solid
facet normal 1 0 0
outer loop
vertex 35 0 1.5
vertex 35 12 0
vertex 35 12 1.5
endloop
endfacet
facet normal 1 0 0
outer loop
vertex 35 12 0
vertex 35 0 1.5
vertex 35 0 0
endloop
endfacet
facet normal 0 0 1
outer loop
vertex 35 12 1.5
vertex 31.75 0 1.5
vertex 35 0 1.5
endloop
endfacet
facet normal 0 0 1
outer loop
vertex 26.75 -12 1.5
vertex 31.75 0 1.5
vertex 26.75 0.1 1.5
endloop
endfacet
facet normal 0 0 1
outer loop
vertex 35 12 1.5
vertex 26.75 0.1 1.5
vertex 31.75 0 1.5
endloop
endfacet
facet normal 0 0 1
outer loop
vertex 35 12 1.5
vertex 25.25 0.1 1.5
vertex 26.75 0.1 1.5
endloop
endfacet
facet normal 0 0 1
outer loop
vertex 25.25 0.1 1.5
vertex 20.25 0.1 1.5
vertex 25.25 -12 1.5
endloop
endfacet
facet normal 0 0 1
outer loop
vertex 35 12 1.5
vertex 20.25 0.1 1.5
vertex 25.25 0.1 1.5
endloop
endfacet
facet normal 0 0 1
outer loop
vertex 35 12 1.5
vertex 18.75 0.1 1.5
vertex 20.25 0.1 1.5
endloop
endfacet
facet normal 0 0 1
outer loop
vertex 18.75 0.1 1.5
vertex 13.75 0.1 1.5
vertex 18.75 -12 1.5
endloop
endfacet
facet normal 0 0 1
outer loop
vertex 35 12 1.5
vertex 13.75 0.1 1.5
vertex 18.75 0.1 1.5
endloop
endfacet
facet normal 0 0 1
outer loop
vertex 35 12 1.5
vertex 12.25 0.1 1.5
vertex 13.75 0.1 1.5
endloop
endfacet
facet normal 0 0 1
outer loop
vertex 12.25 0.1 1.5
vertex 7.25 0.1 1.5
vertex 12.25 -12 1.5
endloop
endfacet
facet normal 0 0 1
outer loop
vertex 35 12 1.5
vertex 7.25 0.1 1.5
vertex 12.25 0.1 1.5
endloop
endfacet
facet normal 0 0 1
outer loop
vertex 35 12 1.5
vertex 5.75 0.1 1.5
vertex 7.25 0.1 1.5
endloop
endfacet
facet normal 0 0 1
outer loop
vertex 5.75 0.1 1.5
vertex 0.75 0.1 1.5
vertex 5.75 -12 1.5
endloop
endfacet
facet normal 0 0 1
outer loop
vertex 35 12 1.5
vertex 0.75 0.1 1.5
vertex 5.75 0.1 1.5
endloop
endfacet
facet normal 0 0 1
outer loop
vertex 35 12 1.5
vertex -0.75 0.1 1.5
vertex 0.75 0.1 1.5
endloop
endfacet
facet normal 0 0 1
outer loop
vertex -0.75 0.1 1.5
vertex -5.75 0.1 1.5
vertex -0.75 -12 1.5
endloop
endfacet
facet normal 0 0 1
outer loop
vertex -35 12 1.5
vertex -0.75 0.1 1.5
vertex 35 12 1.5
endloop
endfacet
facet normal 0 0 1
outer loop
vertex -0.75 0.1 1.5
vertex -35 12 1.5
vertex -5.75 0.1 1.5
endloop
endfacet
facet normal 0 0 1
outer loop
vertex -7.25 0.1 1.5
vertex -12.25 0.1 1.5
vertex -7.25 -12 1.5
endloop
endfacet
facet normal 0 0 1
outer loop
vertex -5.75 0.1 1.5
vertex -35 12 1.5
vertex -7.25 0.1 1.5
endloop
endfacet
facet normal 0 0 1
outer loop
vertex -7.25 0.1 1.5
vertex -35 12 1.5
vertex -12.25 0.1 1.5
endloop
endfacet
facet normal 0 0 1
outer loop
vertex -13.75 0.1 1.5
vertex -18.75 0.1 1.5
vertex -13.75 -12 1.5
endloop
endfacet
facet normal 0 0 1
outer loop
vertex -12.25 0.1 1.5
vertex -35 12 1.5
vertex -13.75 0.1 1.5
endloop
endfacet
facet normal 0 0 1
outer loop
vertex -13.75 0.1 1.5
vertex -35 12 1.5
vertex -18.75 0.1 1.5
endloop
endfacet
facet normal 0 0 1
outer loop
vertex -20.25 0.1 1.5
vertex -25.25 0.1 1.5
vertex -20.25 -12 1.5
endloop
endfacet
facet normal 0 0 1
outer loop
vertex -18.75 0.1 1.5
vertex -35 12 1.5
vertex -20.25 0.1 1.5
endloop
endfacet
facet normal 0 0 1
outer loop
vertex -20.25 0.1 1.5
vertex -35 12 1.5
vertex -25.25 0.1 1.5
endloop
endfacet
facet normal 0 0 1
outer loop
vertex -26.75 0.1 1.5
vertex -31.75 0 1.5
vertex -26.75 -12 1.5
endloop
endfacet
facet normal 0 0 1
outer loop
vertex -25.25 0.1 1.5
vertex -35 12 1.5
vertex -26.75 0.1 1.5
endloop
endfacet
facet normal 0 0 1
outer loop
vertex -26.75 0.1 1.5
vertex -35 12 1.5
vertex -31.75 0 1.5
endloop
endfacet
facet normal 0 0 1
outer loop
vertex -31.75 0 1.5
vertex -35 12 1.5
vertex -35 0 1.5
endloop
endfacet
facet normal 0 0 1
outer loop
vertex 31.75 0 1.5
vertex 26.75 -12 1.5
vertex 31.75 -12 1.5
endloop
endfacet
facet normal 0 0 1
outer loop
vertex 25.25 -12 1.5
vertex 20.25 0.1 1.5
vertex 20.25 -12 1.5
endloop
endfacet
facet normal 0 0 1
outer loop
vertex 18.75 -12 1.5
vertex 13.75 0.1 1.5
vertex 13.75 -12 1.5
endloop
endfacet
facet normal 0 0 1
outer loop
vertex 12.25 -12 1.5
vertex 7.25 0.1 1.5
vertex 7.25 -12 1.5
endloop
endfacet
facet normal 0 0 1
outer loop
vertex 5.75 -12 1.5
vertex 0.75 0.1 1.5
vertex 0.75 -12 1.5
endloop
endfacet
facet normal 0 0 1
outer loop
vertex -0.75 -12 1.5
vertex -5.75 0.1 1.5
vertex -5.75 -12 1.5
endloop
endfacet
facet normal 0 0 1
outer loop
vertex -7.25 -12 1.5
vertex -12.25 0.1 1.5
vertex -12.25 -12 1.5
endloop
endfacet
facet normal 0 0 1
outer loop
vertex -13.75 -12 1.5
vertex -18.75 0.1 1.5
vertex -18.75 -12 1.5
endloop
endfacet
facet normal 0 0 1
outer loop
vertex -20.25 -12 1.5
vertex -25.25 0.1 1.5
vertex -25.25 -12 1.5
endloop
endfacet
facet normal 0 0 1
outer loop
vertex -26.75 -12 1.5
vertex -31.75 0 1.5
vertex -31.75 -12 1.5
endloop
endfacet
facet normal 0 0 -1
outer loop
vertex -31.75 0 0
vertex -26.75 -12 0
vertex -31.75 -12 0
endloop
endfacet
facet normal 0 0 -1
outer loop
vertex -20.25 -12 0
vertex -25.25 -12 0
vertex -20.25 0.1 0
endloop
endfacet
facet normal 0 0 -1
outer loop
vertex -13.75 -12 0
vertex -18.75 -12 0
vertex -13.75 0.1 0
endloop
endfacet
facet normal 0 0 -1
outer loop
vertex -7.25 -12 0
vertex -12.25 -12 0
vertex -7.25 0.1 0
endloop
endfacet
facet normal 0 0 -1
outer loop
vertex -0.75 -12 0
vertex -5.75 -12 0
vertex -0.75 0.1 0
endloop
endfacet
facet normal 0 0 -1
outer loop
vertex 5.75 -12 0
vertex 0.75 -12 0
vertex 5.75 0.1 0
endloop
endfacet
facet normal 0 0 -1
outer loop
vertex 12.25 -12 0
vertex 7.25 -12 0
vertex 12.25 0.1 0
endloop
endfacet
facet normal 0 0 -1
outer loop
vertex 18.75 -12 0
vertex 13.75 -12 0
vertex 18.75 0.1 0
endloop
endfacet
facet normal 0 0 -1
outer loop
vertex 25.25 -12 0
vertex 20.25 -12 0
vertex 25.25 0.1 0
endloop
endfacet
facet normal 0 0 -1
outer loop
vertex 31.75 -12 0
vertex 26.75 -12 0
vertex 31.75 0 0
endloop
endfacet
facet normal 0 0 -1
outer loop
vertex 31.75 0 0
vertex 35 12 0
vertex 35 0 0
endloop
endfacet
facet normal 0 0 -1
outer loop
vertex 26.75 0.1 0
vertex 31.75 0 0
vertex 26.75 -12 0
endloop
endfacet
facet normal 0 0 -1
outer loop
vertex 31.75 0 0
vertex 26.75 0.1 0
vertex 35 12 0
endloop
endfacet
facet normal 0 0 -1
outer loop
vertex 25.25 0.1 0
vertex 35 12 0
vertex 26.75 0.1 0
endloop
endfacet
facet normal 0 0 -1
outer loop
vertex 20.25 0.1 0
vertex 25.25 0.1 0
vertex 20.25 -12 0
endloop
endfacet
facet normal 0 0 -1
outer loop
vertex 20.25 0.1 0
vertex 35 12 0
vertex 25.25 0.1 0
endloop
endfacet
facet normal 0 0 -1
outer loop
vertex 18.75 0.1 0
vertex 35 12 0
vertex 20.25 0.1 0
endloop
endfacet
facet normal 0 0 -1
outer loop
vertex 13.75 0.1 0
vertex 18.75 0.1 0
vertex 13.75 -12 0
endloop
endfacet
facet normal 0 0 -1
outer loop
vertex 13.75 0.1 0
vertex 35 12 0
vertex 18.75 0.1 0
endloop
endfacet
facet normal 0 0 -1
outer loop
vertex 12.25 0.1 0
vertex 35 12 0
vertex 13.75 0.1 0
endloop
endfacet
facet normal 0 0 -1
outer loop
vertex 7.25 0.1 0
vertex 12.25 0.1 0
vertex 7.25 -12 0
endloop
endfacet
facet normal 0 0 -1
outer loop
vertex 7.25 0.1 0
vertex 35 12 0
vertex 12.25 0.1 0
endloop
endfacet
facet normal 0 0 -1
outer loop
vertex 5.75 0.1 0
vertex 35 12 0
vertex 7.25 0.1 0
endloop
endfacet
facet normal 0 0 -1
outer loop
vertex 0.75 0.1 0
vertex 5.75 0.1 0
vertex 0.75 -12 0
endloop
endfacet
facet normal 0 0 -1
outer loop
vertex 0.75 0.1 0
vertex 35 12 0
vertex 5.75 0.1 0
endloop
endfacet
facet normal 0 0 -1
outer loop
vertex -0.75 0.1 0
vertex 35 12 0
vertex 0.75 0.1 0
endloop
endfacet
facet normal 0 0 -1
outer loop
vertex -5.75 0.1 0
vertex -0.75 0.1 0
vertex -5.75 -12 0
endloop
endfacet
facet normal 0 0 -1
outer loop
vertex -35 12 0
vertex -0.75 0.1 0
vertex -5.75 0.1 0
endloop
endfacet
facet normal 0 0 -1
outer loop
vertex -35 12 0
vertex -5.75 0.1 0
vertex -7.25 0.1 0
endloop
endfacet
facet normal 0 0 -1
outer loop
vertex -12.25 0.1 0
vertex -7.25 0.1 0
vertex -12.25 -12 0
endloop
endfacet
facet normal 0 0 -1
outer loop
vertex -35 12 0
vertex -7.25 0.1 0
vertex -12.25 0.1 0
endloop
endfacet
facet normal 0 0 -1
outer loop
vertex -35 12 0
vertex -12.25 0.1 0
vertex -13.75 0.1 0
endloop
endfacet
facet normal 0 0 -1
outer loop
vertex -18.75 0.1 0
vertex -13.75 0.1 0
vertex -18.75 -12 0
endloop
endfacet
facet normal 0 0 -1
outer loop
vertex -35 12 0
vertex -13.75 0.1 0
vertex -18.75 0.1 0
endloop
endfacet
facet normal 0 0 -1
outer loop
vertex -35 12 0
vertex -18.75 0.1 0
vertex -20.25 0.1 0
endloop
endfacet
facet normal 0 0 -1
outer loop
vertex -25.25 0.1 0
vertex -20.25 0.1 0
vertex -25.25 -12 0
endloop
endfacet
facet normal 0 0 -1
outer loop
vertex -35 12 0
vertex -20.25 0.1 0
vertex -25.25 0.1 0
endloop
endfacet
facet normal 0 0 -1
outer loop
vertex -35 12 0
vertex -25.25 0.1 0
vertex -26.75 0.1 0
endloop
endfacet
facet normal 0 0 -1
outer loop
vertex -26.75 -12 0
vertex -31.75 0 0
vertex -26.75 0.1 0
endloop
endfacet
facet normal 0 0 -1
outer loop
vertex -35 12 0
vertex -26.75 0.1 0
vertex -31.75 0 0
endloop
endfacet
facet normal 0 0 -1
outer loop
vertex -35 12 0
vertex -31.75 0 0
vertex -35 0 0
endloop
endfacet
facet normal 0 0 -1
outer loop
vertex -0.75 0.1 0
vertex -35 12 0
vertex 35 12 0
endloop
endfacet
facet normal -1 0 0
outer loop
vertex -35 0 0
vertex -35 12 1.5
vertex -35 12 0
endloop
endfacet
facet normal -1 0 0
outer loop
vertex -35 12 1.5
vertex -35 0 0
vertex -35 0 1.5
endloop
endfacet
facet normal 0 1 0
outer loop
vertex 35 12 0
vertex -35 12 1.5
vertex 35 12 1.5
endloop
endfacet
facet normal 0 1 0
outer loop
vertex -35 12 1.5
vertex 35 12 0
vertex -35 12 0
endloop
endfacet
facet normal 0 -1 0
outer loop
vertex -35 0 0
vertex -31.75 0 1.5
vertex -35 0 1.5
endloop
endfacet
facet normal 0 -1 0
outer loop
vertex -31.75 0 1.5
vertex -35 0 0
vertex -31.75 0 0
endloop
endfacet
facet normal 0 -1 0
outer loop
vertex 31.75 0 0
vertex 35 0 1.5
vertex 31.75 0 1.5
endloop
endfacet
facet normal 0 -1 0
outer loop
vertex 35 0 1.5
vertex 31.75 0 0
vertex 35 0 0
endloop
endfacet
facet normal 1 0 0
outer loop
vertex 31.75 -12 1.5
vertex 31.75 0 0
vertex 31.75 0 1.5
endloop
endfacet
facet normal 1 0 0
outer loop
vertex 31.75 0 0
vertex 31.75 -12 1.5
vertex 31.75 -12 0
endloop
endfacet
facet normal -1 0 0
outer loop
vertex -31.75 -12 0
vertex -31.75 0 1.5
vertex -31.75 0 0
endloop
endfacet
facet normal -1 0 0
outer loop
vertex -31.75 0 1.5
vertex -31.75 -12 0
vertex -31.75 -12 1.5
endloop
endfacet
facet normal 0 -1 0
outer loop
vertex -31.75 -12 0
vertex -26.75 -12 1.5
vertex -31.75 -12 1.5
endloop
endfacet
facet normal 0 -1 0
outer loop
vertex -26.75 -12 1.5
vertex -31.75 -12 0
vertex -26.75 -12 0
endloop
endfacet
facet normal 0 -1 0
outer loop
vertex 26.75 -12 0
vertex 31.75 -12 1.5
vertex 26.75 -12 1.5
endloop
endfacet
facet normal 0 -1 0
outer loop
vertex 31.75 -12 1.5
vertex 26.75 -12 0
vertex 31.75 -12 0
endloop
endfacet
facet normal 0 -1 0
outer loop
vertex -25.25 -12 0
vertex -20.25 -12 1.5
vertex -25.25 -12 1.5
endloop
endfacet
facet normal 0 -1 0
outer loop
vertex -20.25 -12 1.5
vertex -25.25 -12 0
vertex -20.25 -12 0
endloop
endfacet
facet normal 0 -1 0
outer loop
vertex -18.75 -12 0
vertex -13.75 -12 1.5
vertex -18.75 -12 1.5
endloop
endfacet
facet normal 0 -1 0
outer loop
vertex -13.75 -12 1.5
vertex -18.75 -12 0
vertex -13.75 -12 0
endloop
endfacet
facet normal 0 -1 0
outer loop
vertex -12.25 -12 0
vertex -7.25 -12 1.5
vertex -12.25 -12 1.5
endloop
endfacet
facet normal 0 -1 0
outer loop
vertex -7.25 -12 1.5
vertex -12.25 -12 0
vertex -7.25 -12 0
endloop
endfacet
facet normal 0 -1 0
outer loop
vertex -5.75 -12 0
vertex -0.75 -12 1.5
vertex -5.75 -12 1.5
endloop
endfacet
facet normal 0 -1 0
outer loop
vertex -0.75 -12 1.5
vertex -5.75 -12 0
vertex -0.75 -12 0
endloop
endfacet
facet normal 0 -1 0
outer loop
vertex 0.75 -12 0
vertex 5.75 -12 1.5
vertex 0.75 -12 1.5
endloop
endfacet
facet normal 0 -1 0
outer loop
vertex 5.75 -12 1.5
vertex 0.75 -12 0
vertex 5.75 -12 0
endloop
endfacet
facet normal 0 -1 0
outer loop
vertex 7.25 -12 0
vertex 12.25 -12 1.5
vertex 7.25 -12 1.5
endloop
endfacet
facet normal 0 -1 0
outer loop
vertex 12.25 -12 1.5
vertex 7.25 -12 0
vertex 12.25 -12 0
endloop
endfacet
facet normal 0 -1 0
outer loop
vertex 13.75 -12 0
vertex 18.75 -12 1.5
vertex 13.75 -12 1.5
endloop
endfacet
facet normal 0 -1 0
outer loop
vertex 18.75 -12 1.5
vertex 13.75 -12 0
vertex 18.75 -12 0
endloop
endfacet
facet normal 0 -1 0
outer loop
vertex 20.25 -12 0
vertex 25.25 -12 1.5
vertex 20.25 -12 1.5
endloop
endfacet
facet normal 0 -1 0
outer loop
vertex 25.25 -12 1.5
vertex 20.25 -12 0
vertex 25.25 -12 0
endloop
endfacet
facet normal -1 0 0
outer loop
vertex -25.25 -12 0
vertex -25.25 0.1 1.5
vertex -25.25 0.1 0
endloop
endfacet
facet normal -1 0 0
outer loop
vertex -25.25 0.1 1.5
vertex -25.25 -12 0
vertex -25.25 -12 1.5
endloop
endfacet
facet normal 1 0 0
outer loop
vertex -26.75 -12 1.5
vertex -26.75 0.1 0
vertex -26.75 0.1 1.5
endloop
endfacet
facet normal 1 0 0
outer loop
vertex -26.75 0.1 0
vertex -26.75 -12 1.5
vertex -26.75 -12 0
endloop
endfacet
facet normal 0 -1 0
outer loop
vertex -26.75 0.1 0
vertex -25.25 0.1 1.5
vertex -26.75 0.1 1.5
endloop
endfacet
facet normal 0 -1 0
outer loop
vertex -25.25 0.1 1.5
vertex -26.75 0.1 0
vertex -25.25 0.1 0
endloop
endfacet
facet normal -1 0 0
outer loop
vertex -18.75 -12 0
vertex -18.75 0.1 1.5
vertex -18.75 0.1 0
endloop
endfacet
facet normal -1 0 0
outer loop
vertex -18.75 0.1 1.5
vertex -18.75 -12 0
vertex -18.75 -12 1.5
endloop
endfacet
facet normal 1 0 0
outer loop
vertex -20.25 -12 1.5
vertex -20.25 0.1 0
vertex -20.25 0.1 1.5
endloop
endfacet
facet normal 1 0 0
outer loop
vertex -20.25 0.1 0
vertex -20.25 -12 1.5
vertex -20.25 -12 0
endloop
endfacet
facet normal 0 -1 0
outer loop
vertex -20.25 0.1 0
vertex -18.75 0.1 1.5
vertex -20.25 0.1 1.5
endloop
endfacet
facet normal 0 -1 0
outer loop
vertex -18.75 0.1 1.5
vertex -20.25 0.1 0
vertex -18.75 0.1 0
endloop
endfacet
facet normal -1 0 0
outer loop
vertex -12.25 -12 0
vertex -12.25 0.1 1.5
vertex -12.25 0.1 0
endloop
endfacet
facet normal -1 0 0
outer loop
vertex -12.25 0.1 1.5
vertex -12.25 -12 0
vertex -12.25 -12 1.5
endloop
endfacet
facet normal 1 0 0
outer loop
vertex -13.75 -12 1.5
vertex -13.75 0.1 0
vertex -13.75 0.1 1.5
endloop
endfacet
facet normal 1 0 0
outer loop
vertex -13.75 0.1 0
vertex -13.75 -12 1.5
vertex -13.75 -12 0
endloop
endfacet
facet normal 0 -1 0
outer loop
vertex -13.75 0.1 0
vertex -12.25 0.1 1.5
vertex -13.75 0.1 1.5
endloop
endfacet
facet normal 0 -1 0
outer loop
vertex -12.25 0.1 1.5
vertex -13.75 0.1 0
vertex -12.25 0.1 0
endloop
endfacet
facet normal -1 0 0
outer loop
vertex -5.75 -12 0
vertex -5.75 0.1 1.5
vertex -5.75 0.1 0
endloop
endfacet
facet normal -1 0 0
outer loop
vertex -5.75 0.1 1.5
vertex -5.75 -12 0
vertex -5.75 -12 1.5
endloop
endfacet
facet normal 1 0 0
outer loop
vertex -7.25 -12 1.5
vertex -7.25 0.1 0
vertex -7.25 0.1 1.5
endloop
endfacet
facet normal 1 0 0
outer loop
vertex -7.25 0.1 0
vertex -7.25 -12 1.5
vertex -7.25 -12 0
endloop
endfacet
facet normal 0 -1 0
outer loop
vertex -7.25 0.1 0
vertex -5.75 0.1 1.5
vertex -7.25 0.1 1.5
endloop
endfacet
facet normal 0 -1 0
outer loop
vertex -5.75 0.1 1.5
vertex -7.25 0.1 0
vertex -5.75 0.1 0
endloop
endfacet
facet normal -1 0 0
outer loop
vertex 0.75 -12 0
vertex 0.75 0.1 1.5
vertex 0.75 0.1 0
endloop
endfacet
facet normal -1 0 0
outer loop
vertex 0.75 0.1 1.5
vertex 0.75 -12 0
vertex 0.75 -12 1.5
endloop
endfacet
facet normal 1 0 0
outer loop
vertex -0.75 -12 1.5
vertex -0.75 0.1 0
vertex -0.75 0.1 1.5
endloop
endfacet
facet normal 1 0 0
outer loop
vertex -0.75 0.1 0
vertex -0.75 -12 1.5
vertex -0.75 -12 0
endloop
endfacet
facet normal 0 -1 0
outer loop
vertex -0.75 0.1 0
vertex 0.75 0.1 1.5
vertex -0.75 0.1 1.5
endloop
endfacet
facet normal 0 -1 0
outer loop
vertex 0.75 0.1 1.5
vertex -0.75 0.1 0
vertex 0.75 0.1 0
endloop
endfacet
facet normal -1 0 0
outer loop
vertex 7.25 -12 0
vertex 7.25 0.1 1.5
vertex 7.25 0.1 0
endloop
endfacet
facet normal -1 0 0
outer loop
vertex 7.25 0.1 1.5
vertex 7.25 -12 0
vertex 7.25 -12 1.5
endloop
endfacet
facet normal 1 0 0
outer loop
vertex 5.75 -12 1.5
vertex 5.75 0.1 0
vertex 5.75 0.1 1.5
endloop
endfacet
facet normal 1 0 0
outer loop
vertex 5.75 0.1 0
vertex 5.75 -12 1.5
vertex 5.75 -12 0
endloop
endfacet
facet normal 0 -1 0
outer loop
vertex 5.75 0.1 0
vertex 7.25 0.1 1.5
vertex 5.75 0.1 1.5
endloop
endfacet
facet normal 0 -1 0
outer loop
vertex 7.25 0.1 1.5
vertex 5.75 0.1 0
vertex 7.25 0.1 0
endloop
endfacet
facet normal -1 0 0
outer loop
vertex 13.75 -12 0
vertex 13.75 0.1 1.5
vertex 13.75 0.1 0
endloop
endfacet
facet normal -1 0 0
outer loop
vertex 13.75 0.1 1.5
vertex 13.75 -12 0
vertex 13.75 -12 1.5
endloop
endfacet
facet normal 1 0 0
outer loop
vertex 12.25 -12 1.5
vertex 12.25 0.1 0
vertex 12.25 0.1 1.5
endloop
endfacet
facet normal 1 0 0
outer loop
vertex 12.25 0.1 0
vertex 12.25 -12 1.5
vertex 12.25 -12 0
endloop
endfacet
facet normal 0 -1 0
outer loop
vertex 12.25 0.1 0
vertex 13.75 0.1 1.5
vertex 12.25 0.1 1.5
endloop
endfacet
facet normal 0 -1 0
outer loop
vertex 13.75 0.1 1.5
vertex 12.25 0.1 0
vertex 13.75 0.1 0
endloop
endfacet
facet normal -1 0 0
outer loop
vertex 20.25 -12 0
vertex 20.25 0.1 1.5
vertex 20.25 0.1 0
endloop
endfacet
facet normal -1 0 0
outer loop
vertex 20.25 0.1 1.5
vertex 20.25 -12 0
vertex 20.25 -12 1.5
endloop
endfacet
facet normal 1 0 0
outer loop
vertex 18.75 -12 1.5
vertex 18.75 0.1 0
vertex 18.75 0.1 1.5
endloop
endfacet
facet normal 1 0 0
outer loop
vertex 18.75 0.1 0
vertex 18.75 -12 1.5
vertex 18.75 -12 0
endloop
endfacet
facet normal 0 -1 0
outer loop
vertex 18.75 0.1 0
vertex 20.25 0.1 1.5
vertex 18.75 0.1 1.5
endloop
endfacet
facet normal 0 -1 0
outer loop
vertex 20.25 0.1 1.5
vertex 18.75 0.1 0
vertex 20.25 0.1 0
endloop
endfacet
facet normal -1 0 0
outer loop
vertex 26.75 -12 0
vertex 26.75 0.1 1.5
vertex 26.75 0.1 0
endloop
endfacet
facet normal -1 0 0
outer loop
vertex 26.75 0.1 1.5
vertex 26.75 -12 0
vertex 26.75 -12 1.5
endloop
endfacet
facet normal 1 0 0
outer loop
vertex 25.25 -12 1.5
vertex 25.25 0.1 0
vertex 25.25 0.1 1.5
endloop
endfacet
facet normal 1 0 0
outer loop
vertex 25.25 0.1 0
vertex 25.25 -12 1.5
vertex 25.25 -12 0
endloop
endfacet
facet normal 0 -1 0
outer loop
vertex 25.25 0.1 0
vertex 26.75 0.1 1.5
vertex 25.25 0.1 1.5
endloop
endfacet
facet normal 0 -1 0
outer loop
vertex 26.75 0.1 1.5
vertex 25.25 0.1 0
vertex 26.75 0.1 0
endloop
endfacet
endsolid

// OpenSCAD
// 10-well agarose gel comb
// Designed for FDM printing, lying flat on the XY plane.

// --- Dimensions ---
spine_l    = 70.0;    // Length of the spine (X)
spine_w    = 12.0;    // Width of the spine (Y)
plate_t    = 1.5;     // Thickness of the plate (Z)
tooth_w    = 5.0;     // Width of each tooth (X)
tooth_l    = 12.0;    // Length of each tooth (Y)
gap_w      = 1.5;     // Gap between teeth (X)
num_teeth  = 10;      // Number of teeth

$fn = 64;

// --- Calculations ---
// Total width occupied by the teeth and the gaps between them
total_teeth_width = (num_teeth * tooth_w) + ((num_teeth - 1) * gap_w);

// The teeth are centered on the spine in X.
// The spine is placed from Y = 0 to Y = spine_w.
// The teeth hang from the edge at Y = 0 in the -Y direction.
// Therefore, the teeth occupy the Y range [-tooth_l, 0].

difference() {
    // 1. The Solid Body
    union() {
        // The spine (the back bar)
        translate([-spine_l / 2, 0, 0])
            cube([spine_l, spine_w, plate_t]);
        
        // The block containing the teeth
        // We center this block in X so the teeth are centered on the spine
        translate([-total_teeth_width / 2, -tooth_l, 0])
            cube([total_teeth_width, tooth_l, plate_t]);
    }

    // 2. The Gaps (The spaces between the teeth)
    // We iterate through the gaps. There are (num_teeth - 1) gaps.
    // We use a loop to place a rectangular subtraction for each gap.
    for (i = [0 : num_teeth - 2]) {
        // Calculate the X position for the current gap
        // Gap 0 is after Tooth 0.
        // Gap X = (Start of teeth) + (Width of current tooth) + (Width of all previous gaps)
        // Simplified: Start + (i+1)*tooth_w + i*gap_w
        let (gap_x_start = -total_teeth_width / 2 + (i + 1) * tooth_w + i * gap_w)
        translate([gap_x_start, -tooth_l - 0.1, -0.1])
            cube([gap_w, tooth_l + 0.2, plate_t + 0.2]);
    }
}
